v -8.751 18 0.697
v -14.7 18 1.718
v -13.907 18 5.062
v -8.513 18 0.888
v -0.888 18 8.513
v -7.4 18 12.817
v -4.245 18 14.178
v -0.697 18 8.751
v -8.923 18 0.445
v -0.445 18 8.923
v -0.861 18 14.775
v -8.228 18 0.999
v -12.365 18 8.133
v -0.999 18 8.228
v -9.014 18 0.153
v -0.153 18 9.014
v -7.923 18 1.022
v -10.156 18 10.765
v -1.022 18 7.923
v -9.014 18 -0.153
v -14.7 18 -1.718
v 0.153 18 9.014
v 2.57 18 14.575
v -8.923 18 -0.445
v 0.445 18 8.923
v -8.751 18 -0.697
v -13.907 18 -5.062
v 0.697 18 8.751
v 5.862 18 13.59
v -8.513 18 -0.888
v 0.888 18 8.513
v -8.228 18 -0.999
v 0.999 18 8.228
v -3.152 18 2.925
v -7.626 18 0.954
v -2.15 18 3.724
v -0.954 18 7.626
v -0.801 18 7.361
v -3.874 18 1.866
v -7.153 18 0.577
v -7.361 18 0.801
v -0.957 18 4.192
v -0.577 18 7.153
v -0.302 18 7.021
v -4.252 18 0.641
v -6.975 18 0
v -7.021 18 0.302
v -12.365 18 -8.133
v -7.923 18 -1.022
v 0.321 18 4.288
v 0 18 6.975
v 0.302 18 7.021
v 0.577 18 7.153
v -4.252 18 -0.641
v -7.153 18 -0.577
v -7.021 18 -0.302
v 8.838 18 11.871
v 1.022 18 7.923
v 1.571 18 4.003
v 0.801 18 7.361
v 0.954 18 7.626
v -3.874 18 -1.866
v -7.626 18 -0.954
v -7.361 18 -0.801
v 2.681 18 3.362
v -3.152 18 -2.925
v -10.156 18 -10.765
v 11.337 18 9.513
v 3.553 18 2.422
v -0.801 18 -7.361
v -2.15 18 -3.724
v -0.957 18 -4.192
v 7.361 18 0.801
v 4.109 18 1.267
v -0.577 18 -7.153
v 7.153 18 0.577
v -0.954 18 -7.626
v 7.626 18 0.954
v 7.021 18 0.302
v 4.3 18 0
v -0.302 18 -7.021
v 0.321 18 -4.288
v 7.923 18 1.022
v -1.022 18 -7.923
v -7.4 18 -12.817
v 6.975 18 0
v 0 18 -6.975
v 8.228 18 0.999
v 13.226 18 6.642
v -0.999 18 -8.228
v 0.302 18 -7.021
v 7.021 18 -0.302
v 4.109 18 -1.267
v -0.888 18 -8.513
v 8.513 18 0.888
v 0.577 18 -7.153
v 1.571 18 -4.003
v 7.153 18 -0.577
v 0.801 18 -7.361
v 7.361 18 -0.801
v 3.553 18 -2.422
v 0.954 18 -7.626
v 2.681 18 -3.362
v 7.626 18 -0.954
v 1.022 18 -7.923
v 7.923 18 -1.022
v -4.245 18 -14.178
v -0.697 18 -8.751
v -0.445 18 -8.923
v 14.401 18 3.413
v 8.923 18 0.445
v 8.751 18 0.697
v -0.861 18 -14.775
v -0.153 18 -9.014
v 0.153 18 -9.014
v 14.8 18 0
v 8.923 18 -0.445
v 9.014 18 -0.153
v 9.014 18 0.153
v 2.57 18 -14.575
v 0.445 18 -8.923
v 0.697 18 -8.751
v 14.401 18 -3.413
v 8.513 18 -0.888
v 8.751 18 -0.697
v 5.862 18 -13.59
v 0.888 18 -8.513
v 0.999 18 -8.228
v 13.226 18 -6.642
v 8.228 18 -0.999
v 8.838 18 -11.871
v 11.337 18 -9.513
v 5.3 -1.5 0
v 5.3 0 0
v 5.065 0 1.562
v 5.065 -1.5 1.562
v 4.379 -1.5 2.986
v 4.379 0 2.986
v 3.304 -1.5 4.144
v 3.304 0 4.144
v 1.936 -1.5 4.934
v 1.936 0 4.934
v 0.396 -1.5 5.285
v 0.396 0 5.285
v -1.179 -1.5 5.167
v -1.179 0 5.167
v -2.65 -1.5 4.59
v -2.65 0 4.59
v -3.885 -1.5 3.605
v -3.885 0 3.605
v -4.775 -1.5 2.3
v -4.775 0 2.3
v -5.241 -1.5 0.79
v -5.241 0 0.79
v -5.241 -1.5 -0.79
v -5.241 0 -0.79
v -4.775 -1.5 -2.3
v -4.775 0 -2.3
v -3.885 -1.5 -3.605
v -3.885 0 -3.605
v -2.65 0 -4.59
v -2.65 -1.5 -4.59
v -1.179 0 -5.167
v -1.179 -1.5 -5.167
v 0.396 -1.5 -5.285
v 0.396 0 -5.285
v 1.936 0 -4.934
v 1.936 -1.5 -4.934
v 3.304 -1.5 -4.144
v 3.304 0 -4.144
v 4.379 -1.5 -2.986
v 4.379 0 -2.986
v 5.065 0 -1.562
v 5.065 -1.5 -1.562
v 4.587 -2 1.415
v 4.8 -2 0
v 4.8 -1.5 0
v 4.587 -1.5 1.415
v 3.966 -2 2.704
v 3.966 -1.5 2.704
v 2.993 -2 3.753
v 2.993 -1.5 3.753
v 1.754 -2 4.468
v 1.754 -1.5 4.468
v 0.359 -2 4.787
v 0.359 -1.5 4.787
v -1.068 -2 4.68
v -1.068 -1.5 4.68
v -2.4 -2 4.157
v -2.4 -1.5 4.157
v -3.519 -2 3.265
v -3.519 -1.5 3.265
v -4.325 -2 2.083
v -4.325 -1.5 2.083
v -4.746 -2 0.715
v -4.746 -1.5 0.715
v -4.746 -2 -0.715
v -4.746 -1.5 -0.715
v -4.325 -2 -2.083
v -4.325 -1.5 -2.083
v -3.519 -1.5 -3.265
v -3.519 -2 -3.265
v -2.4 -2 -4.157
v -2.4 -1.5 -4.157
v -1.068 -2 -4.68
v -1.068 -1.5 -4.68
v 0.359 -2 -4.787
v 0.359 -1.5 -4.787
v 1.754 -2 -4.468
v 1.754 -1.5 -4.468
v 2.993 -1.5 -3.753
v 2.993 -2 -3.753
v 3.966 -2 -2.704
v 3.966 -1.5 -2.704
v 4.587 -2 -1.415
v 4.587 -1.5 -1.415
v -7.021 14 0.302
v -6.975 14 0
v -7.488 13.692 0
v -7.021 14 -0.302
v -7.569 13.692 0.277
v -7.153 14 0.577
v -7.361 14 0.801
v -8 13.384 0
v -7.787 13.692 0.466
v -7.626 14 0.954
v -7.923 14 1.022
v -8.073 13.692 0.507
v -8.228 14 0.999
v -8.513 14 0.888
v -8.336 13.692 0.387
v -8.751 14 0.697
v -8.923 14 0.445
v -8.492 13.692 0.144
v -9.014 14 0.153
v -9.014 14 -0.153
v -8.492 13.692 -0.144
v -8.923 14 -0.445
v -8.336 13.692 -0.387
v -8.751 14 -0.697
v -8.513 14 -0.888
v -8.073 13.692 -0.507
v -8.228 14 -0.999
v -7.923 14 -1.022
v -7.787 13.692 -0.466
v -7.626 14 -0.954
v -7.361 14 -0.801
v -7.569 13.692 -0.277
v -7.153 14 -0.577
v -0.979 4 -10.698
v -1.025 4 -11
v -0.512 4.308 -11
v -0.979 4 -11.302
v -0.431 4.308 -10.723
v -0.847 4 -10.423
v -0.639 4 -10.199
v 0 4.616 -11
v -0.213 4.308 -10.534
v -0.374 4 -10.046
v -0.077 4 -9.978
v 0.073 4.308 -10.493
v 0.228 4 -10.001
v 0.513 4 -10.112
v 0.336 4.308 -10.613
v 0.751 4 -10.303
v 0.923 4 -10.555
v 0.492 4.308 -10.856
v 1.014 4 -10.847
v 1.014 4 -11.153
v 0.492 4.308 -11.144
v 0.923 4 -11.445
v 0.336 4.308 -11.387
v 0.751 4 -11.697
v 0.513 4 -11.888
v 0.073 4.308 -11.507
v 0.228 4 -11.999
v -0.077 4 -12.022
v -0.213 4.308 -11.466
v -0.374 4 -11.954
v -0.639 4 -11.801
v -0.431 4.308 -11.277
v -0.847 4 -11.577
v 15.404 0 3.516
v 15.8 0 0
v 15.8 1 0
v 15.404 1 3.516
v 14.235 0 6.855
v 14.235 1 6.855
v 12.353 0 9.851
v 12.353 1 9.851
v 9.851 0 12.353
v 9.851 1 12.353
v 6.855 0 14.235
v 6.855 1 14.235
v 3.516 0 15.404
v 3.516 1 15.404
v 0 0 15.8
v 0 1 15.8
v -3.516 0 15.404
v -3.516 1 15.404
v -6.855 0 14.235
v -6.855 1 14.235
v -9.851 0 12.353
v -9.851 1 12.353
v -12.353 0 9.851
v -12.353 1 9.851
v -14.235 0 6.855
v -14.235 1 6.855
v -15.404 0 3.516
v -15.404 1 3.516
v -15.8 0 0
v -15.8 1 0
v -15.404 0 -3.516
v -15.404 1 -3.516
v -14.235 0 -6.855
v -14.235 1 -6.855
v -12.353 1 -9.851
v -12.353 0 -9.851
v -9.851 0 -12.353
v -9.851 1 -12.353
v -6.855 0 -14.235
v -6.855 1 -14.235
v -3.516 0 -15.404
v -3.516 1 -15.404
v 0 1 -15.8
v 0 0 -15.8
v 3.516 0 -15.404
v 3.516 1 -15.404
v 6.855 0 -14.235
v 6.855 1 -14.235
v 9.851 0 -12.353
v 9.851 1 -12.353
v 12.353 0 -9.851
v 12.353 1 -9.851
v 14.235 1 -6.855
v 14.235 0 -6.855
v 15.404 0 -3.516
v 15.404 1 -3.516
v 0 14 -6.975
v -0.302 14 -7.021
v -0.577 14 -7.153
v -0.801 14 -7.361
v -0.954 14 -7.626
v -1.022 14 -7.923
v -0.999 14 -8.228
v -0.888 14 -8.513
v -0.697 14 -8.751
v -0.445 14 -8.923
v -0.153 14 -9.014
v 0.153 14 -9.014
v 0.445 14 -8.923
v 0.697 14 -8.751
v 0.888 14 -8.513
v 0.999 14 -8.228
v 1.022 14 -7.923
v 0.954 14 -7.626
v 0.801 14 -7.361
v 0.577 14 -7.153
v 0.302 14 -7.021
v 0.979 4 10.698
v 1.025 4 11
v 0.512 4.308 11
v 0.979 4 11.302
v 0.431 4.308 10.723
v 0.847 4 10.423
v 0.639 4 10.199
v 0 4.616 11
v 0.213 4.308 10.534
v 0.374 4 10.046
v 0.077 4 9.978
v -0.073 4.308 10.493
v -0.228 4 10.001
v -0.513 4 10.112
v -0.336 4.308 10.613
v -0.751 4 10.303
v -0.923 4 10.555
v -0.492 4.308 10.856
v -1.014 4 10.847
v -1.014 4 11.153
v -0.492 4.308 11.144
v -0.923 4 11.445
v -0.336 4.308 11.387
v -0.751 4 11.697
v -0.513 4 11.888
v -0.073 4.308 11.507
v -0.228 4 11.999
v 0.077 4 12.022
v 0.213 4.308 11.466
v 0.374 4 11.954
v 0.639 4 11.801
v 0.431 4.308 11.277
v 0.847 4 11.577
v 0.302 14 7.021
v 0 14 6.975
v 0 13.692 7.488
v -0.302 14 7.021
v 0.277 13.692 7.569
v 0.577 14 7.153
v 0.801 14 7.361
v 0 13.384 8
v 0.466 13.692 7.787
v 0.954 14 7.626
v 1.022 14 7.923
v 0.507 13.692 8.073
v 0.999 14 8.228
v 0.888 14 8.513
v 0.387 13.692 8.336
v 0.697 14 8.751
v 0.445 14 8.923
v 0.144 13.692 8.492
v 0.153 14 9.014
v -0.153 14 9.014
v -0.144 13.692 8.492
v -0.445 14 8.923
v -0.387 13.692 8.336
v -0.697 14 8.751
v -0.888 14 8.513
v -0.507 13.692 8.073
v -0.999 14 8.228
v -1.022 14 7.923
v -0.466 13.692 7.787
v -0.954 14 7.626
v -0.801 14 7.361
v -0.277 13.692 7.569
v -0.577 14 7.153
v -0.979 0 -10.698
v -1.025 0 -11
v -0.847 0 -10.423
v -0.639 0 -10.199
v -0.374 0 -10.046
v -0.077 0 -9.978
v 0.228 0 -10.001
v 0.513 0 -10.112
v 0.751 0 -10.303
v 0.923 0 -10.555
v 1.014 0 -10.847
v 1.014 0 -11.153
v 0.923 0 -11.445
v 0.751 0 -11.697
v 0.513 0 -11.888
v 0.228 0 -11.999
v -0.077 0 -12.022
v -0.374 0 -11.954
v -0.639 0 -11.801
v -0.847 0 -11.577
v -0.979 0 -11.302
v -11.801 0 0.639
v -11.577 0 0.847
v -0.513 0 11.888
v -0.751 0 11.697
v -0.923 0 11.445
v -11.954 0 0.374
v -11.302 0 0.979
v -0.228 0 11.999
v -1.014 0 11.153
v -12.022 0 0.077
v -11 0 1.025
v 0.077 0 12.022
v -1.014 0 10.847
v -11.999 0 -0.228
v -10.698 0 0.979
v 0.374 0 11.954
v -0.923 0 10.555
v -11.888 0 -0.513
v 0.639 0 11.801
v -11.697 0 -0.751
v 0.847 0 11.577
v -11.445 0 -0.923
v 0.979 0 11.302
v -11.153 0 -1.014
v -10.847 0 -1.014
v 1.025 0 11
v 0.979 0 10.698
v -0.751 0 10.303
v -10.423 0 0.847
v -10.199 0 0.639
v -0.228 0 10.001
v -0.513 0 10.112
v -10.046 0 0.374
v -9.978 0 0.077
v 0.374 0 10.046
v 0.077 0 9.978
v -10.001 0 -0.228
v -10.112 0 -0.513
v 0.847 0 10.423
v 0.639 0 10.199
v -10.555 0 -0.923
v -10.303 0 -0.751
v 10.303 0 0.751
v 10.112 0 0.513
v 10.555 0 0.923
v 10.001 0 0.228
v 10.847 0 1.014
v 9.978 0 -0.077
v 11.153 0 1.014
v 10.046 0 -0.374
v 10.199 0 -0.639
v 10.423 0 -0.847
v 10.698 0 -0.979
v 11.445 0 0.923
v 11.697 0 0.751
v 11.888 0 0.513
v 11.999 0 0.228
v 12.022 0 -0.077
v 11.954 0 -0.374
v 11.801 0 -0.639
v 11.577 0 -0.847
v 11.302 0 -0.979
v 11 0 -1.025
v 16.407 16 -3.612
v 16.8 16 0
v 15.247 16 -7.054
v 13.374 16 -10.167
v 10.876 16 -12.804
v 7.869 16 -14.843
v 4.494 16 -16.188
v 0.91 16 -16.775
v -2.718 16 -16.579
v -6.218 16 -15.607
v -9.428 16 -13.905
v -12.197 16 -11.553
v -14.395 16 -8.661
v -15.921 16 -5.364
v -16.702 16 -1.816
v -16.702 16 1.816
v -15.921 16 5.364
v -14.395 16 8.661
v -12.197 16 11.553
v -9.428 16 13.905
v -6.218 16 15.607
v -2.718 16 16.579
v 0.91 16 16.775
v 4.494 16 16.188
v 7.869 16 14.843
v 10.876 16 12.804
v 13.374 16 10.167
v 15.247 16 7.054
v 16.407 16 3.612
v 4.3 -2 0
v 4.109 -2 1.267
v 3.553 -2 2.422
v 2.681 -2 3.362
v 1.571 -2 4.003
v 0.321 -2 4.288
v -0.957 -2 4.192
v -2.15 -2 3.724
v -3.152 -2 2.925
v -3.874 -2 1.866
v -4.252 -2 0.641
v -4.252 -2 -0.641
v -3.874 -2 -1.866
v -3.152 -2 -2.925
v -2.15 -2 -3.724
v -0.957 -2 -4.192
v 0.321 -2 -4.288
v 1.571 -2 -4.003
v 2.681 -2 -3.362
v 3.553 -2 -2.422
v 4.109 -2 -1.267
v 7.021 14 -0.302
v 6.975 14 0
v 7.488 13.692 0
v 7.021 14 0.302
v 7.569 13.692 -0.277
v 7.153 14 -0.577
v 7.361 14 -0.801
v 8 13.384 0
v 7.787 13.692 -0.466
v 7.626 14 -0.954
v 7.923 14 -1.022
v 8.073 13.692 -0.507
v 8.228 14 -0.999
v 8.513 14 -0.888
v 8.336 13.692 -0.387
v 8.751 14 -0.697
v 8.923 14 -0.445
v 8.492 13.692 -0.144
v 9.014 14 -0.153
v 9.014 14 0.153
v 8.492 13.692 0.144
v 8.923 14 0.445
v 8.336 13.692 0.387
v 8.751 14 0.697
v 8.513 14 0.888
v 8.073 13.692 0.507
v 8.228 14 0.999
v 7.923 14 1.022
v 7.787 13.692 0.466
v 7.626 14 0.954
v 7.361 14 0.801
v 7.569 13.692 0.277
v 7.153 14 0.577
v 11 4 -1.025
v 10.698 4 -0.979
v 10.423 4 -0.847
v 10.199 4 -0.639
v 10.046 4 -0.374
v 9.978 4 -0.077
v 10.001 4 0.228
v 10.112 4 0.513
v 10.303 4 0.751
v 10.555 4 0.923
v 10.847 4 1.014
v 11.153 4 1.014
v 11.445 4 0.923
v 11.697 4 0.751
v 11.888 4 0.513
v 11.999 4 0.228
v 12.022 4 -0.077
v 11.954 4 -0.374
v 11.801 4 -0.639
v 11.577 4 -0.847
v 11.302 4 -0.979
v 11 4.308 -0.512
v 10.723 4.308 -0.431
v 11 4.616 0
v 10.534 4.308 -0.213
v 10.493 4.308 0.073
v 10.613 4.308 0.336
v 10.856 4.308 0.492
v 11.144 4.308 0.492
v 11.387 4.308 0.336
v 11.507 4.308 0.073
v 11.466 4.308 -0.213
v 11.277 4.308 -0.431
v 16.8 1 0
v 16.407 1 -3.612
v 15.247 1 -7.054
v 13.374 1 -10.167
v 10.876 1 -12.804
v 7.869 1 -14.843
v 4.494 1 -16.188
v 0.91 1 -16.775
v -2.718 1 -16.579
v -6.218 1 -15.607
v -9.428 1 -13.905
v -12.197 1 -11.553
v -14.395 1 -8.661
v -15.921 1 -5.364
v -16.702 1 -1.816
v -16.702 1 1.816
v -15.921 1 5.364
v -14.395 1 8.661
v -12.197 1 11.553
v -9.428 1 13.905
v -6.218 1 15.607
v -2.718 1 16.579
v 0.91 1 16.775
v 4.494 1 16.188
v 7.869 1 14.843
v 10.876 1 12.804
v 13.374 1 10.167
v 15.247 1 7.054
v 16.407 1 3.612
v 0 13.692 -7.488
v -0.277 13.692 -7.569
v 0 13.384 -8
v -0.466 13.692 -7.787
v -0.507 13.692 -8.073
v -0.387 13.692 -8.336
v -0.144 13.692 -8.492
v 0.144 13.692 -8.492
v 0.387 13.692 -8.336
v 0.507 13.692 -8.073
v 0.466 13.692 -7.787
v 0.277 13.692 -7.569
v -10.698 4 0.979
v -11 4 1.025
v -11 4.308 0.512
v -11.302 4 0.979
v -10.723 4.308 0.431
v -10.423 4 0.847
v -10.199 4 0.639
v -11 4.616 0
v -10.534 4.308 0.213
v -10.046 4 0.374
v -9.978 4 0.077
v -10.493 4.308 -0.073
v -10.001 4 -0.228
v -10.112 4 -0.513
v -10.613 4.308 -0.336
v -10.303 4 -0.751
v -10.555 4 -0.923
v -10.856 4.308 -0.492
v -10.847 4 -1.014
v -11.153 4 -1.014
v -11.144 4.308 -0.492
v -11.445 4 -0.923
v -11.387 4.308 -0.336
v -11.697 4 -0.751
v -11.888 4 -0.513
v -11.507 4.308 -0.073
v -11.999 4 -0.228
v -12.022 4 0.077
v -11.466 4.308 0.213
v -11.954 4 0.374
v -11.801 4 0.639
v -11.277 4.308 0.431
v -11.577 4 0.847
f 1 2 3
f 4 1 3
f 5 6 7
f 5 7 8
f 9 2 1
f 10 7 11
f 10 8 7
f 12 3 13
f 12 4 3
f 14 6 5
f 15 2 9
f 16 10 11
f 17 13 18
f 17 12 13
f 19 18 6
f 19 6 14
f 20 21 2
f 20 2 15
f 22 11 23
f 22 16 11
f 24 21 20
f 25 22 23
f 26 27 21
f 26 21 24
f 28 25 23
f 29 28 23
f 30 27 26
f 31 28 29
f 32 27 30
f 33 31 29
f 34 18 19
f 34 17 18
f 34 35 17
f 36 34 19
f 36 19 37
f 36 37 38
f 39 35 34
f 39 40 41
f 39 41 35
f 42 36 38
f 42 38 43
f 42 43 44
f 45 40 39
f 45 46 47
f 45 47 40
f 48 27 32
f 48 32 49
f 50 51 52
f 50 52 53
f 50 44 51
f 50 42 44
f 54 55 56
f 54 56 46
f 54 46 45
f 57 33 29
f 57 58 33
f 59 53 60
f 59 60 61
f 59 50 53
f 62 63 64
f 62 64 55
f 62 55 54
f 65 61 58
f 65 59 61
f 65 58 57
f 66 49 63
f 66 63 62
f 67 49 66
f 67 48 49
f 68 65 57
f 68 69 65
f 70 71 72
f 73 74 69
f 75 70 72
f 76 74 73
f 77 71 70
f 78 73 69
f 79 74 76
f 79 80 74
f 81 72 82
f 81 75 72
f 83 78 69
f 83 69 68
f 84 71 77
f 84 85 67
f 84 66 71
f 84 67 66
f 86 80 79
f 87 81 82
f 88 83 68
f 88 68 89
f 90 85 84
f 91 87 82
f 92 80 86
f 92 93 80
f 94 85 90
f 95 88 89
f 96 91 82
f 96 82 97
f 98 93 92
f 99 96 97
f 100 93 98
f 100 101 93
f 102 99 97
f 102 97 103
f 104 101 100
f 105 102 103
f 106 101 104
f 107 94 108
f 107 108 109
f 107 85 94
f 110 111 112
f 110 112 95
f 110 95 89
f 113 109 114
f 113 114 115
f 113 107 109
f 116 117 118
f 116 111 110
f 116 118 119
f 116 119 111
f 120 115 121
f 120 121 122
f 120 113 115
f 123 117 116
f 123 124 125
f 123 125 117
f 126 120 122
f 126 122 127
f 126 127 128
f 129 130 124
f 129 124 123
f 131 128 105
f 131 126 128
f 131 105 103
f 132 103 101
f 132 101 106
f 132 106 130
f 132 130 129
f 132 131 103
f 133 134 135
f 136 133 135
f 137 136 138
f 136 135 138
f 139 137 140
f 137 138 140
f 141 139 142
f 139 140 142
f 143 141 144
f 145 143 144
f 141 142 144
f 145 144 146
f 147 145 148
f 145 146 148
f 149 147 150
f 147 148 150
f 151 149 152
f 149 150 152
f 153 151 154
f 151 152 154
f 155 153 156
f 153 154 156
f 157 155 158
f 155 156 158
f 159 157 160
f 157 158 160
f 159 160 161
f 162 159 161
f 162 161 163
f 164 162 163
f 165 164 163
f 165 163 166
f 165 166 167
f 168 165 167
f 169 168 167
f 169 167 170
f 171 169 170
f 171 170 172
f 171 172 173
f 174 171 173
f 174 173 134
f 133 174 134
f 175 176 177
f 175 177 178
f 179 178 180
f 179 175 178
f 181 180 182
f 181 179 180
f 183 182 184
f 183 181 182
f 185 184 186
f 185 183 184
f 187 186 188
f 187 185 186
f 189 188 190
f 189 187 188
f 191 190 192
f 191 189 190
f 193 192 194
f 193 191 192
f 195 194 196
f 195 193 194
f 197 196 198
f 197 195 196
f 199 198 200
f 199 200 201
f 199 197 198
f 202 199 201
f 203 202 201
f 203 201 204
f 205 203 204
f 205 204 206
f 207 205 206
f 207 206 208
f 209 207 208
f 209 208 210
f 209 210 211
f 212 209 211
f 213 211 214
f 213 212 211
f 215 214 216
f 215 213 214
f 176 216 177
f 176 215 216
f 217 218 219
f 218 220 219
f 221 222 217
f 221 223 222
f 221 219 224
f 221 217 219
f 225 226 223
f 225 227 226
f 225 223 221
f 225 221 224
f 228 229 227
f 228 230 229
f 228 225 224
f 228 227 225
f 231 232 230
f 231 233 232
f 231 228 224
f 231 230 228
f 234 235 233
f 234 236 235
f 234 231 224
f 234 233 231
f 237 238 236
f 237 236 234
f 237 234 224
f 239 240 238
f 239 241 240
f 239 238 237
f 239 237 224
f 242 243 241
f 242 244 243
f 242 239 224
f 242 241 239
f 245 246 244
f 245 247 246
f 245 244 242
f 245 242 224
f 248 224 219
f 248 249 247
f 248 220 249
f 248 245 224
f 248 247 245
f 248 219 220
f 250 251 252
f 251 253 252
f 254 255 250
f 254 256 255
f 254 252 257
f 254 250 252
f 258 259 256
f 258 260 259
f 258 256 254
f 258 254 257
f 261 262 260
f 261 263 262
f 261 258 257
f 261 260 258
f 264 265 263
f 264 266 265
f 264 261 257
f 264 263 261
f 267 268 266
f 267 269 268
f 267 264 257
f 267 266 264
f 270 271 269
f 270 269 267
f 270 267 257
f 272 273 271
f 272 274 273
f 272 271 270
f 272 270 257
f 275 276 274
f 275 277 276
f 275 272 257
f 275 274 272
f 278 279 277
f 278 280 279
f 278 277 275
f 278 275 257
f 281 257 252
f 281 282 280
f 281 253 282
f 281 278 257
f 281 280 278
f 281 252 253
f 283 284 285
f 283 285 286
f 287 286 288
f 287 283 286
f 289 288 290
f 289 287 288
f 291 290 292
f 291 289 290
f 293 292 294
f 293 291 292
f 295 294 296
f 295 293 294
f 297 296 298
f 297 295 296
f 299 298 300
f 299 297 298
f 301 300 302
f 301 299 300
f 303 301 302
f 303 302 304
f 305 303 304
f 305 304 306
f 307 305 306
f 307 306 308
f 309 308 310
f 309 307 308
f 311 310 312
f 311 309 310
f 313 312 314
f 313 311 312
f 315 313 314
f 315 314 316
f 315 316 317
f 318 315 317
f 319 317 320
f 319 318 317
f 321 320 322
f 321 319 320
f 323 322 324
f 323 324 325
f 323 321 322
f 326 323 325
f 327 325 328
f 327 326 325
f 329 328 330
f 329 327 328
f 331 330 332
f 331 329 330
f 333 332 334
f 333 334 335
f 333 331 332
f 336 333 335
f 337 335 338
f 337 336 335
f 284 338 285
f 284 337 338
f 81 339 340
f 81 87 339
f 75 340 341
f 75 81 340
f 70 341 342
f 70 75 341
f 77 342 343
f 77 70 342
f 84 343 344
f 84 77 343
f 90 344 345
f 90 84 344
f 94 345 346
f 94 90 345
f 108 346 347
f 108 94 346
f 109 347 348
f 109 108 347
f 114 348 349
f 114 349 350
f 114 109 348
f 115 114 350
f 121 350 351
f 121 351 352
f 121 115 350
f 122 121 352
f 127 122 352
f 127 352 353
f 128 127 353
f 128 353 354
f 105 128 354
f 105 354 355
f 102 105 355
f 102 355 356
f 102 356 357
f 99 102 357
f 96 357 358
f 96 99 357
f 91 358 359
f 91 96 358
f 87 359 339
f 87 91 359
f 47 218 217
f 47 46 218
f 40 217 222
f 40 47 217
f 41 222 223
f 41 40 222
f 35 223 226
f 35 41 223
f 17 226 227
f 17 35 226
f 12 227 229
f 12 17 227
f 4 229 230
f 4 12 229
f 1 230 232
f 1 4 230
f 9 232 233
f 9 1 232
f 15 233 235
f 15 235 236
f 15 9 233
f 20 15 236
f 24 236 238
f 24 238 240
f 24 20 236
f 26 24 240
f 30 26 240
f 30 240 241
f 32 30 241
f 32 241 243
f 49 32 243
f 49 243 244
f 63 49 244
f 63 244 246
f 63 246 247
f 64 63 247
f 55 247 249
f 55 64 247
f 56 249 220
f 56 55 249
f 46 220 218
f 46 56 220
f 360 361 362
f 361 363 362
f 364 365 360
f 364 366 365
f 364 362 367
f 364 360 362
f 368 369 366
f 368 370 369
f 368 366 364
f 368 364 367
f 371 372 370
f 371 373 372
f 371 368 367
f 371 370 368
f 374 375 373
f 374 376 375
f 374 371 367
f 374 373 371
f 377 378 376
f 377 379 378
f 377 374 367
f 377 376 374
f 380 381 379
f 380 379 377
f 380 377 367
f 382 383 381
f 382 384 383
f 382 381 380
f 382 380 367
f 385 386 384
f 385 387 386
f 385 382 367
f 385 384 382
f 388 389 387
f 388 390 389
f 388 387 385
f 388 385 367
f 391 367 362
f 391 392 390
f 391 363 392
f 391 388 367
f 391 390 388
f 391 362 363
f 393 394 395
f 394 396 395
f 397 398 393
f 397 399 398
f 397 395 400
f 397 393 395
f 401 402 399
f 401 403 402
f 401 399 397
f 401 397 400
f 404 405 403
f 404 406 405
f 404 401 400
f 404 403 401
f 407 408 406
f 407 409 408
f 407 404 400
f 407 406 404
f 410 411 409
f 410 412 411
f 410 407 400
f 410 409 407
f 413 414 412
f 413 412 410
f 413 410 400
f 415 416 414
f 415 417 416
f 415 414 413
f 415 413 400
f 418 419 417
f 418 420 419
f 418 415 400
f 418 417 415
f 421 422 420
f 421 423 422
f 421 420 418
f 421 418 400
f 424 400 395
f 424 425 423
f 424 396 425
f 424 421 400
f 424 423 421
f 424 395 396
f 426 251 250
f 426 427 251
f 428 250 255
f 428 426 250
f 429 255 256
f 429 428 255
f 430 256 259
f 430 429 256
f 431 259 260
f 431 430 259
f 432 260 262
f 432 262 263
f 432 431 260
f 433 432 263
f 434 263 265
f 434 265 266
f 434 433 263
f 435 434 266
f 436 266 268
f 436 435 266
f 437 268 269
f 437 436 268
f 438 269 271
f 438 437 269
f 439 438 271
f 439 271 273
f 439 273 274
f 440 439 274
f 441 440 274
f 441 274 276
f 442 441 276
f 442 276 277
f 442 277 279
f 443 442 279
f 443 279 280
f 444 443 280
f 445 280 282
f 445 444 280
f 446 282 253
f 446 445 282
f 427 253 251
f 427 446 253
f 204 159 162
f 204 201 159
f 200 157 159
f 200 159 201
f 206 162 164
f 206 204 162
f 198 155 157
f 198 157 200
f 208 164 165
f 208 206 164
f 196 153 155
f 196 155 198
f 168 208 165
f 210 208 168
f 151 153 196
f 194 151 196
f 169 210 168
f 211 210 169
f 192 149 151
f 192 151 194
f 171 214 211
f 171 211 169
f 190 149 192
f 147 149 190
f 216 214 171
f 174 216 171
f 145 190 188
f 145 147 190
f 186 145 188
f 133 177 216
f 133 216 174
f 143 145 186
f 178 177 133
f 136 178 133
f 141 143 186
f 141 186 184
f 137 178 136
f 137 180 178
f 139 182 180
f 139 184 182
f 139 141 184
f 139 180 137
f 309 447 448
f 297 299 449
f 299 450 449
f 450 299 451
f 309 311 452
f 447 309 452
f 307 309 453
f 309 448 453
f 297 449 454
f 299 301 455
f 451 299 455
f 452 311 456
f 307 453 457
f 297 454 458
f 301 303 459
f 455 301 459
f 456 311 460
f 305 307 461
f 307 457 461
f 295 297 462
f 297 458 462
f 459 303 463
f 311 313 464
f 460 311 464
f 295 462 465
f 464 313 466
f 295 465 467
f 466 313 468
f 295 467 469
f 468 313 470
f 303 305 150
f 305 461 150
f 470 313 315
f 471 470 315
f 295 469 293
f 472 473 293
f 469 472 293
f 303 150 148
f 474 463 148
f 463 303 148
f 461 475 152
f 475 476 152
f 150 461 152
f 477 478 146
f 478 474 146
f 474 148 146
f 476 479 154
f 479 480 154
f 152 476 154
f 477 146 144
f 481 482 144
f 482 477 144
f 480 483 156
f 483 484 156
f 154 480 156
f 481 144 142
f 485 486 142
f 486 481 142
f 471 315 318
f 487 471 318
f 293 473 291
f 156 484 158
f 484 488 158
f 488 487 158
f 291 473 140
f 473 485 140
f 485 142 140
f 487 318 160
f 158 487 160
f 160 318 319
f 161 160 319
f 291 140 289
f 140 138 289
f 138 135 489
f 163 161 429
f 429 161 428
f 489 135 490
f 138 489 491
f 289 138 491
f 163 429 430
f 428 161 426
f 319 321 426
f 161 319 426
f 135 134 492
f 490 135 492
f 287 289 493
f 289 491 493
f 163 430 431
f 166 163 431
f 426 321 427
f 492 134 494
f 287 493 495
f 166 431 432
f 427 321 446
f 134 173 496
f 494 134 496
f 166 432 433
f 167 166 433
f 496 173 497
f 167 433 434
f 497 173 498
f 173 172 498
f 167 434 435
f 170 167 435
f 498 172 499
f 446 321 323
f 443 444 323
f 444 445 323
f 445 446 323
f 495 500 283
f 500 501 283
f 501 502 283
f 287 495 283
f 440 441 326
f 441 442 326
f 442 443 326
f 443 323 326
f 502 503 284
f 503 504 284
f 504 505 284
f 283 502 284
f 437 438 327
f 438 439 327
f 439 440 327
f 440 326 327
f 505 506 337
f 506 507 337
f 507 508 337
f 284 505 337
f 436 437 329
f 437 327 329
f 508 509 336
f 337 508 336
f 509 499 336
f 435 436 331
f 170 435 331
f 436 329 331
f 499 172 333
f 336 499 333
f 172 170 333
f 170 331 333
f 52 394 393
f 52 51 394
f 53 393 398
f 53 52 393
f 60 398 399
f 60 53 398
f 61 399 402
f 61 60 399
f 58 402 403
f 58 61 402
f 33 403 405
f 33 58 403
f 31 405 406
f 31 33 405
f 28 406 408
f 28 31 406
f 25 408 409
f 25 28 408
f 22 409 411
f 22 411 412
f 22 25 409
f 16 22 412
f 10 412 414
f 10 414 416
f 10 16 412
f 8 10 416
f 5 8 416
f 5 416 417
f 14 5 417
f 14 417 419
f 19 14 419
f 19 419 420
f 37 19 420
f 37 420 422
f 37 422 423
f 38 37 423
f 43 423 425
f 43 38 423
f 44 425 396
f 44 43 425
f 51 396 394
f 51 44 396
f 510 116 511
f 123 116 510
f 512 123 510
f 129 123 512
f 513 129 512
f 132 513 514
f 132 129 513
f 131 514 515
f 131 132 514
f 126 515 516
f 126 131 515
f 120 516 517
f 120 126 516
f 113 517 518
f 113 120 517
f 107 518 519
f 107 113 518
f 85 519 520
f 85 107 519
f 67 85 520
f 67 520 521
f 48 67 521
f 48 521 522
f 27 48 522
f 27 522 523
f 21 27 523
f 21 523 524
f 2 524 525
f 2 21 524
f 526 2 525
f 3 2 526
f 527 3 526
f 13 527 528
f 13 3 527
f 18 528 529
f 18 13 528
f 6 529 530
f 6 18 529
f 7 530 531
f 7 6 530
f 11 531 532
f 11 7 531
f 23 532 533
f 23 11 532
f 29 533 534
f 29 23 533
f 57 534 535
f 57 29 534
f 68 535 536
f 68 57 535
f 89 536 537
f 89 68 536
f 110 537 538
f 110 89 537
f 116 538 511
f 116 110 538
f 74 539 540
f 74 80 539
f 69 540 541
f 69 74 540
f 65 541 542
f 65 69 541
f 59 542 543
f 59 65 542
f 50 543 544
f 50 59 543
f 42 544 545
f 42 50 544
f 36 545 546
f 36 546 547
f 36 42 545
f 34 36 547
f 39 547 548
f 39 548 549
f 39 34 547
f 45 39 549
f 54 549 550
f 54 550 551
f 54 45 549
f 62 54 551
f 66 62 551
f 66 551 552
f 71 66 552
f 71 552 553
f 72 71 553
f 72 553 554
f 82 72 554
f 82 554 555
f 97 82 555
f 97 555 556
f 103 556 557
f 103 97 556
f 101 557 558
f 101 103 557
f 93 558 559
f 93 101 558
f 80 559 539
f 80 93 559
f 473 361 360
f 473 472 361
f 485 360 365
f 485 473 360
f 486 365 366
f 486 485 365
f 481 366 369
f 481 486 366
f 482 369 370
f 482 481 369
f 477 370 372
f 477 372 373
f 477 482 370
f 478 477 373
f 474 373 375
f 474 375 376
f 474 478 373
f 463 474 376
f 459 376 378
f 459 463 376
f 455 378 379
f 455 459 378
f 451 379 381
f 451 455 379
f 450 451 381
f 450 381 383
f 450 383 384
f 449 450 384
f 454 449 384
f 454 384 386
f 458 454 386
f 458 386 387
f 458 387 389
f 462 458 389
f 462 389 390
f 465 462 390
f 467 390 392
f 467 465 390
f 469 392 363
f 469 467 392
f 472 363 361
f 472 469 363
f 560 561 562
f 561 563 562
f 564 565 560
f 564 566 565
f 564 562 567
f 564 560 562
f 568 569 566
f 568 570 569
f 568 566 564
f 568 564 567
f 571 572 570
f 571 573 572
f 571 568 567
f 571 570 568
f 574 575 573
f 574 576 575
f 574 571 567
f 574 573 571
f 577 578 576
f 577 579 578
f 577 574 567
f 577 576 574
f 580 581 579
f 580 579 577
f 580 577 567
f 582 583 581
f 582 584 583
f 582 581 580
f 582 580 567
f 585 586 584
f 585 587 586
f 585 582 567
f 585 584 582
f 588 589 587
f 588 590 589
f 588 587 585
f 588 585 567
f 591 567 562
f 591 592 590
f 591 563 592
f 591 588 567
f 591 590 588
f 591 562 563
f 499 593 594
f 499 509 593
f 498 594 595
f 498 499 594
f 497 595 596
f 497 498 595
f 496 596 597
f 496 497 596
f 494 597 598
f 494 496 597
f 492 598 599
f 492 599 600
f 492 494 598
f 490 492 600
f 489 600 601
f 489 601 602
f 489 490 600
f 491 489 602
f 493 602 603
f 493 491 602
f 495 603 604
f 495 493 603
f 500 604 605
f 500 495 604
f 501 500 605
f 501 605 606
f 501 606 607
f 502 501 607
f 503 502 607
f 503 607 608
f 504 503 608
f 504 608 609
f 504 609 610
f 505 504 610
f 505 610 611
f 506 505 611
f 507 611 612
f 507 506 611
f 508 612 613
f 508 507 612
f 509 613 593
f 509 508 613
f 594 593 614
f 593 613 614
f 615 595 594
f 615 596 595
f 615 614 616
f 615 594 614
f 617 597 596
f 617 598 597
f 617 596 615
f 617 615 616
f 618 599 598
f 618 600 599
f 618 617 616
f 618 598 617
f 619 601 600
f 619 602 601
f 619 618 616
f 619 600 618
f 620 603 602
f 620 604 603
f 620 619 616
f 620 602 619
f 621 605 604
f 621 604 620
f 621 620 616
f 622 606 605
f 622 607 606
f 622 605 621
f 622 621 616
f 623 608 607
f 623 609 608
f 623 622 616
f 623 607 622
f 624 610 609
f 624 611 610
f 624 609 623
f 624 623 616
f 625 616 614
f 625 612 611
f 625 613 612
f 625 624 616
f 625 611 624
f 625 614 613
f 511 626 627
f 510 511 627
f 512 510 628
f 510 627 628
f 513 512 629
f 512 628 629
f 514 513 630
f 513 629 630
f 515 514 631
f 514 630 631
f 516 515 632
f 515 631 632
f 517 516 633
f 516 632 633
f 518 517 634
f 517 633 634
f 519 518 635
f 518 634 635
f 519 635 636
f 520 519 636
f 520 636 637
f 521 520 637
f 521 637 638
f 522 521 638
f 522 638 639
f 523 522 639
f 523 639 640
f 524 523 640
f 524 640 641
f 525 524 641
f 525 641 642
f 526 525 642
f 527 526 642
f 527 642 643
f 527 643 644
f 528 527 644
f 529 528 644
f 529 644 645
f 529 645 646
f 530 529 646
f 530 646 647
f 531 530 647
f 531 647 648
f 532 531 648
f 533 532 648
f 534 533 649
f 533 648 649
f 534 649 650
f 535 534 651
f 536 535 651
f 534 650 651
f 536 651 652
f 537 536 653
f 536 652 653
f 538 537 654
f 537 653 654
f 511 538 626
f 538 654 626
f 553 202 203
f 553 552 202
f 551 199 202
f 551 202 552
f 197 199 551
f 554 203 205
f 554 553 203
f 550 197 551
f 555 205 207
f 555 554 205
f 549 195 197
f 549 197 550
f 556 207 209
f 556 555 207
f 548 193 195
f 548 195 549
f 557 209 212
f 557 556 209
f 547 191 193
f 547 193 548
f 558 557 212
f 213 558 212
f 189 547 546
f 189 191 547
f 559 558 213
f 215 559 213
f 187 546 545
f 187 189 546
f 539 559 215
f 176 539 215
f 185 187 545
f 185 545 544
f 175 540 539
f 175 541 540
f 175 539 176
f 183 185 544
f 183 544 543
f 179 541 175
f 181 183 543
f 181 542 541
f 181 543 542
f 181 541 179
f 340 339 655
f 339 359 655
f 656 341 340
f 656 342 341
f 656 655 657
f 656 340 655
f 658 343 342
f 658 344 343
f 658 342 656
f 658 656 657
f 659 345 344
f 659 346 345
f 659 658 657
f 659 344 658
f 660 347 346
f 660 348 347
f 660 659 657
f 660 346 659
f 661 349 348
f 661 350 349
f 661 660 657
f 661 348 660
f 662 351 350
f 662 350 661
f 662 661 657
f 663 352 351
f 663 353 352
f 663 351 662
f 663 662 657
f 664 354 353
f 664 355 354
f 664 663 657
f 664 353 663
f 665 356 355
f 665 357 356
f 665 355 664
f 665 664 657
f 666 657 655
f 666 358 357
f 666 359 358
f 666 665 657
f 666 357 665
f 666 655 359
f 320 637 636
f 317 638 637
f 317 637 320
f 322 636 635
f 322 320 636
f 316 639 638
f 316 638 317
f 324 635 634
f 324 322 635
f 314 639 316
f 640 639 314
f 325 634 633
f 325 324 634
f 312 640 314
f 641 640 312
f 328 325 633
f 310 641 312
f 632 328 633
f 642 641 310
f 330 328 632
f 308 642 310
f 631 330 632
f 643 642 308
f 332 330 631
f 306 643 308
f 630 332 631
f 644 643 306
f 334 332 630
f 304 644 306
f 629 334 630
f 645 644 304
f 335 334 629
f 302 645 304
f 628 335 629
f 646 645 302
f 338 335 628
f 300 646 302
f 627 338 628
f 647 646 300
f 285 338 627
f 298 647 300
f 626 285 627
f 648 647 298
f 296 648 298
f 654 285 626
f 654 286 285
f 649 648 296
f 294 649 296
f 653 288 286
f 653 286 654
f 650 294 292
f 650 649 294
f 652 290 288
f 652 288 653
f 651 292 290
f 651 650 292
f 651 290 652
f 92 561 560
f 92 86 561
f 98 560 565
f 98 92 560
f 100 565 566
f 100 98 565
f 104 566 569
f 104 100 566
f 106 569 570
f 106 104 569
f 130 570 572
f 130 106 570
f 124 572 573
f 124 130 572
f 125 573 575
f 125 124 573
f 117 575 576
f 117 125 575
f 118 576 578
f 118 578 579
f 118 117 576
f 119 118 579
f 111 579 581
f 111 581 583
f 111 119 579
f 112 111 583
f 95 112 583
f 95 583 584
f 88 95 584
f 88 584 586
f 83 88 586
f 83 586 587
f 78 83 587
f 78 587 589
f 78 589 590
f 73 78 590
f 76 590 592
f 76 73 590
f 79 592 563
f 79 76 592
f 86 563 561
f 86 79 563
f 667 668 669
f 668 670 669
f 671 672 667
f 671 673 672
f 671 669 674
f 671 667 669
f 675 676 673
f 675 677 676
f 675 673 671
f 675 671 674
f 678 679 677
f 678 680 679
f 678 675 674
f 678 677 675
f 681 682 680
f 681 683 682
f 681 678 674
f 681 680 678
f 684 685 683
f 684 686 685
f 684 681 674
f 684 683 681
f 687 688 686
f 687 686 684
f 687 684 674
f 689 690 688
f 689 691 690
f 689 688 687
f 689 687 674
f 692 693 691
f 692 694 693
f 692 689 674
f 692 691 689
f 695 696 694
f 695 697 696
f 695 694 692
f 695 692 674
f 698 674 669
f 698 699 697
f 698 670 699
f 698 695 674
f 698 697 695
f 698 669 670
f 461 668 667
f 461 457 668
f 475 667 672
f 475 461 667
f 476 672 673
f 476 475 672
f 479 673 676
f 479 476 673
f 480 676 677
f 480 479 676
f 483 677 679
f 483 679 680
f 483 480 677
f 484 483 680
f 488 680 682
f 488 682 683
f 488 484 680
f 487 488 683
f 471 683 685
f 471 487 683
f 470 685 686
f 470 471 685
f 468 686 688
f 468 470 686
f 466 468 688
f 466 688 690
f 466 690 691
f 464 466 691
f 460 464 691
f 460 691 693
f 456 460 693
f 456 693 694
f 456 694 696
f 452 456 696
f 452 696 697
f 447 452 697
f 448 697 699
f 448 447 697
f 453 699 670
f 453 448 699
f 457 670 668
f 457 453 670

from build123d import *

# Parameters (mm, degrees)
SKETCH_2_R               = 16.8
EXTRUDE_1_DEPTH          = 18
SKETCH_4_R               = 4.3
CUT_EXTRUDE_1_DEPTH      = 30.807381636
CHAMFER_1_SIZE           = 2
PATTERN_CIRCULAR_1_COUNT = 4
SKETCH_8_R               = 5.3
SKETCH_8_R_2             = 4.3
EXTRUDE_1_2_DEPTH        = 2
CUT_EXTRUDE_START        = -0.5
SKETCH_9_R               = 5.3
SKETCH_9_R_2             = 4.8
CUT_EXTRUDE_1_2_DEPTH    = 0.5
SKETCH_10_R              = 16.8
SKETCH_10_R_2            = 15.8
CUT_EXTRUDE_2_DEPTH      = 1
PATTERN_CIRCULAR_2_COUNT = 4


with BuildPart() as part:
    # 草图2 → Extrude 1 (new body)
    with BuildSketch(Plane(origin=(0, 0, 0), x_dir=(1, 0, 0), z_dir=(0, 1, 0))):
        Circle(SKETCH_2_R)
    extrude(amount=EXTRUDE_1_DEPTH)

    # 草图4 → Cut-Extrude 1 (cut, through all)
    with BuildSketch(Plane(origin=(0, 18, 0), x_dir=(1, 0, 0), z_dir=(0, 1, 0))):
        Circle(SKETCH_4_R)
    extrude(amount=-CUT_EXTRUDE_1_DEPTH, mode=Mode.SUBTRACT)

    # 倒角1
    chamfer_1_edges = [part.edges().sort_by_distance(p)[0] for p in [
        (-16.8, 18, 0),
    ]]
    chamfer(chamfer_1_edges, length=CHAMFER_1_SIZE)

    # 草图7 → M2.5 螺纹孔1 (revolve, cut)
    with BuildSketch(Plane(origin=(0, 18, -8), x_dir=(0, 0, 1), z_dir=(1, 0, 0))):
        Polygon((0, 0), (0, 4.615882135), (1.025, 4), (1.025, 0), align=None)
    hole_wizard_m2_5_1 = revolve(axis=Axis((0, 24.35, -8), (0, -1, 0)), mode=Mode.SUBTRACT)

    # 阵列(圆周)1: M2.5 螺纹孔1 ×4 about axis
    pattern_circular_1_axis = Axis((0, 0, 0), (0, 1, 0))
    for i in range(1, PATTERN_CIRCULAR_1_COUNT):
        add(hole_wizard_m2_5_1.rotate(pattern_circular_1_axis, i * 360 / PATTERN_CIRCULAR_1_COUNT), mode=Mode.SUBTRACT)

    # 草图8 → Extrude 1 2 (add)
    with BuildSketch(Plane.XZ):
        Circle(SKETCH_8_R)
        Circle(SKETCH_8_R_2, mode=Mode.SUBTRACT)
    extrude(amount=EXTRUDE_1_2_DEPTH)

    # 草图9 → Cut-Extrude 1 2 (cut)
    with BuildSketch(Plane.XZ.offset(2).offset(CUT_EXTRUDE_START)):
        Circle(SKETCH_9_R)
        Circle(SKETCH_9_R_2, mode=Mode.SUBTRACT)
    extrude(amount=CUT_EXTRUDE_1_2_DEPTH, mode=Mode.SUBTRACT)

    # 草图10 → 切除-拉伸-薄壁2 (cut)
    with BuildSketch(Plane.XZ):
        Circle(SKETCH_10_R)
        Circle(SKETCH_10_R_2, mode=Mode.SUBTRACT)
    extrude(amount=-CUT_EXTRUDE_2_DEPTH, mode=Mode.SUBTRACT)

    # 草图12 → M2.5 螺纹孔2 (revolve, cut)
    with BuildSketch(Plane(origin=(11, 0, 0), x_dir=(0, 0, -1), z_dir=(1, 0, 0))):
        Polygon((0, 0), (0, 4.615882135), (1.025, 4), (1.025, 0), align=None)
    hole_wizard_m2_5_2 = revolve(axis=Axis((11, -6.35, 0), (0, 1, 0)), mode=Mode.SUBTRACT)

    # 阵列(圆周)2: M2.5 螺纹孔2 ×4 about axis
    pattern_circular_2_axis = Axis((0, 0, 0), (0, 1, 0))
    for i in range(1, PATTERN_CIRCULAR_2_COUNT):
        add(hole_wizard_m2_5_2.rotate(pattern_circular_2_axis, i * 360 / PATTERN_CIRCULAR_2_COUNT), mode=Mode.SUBTRACT)


solid = part.part
